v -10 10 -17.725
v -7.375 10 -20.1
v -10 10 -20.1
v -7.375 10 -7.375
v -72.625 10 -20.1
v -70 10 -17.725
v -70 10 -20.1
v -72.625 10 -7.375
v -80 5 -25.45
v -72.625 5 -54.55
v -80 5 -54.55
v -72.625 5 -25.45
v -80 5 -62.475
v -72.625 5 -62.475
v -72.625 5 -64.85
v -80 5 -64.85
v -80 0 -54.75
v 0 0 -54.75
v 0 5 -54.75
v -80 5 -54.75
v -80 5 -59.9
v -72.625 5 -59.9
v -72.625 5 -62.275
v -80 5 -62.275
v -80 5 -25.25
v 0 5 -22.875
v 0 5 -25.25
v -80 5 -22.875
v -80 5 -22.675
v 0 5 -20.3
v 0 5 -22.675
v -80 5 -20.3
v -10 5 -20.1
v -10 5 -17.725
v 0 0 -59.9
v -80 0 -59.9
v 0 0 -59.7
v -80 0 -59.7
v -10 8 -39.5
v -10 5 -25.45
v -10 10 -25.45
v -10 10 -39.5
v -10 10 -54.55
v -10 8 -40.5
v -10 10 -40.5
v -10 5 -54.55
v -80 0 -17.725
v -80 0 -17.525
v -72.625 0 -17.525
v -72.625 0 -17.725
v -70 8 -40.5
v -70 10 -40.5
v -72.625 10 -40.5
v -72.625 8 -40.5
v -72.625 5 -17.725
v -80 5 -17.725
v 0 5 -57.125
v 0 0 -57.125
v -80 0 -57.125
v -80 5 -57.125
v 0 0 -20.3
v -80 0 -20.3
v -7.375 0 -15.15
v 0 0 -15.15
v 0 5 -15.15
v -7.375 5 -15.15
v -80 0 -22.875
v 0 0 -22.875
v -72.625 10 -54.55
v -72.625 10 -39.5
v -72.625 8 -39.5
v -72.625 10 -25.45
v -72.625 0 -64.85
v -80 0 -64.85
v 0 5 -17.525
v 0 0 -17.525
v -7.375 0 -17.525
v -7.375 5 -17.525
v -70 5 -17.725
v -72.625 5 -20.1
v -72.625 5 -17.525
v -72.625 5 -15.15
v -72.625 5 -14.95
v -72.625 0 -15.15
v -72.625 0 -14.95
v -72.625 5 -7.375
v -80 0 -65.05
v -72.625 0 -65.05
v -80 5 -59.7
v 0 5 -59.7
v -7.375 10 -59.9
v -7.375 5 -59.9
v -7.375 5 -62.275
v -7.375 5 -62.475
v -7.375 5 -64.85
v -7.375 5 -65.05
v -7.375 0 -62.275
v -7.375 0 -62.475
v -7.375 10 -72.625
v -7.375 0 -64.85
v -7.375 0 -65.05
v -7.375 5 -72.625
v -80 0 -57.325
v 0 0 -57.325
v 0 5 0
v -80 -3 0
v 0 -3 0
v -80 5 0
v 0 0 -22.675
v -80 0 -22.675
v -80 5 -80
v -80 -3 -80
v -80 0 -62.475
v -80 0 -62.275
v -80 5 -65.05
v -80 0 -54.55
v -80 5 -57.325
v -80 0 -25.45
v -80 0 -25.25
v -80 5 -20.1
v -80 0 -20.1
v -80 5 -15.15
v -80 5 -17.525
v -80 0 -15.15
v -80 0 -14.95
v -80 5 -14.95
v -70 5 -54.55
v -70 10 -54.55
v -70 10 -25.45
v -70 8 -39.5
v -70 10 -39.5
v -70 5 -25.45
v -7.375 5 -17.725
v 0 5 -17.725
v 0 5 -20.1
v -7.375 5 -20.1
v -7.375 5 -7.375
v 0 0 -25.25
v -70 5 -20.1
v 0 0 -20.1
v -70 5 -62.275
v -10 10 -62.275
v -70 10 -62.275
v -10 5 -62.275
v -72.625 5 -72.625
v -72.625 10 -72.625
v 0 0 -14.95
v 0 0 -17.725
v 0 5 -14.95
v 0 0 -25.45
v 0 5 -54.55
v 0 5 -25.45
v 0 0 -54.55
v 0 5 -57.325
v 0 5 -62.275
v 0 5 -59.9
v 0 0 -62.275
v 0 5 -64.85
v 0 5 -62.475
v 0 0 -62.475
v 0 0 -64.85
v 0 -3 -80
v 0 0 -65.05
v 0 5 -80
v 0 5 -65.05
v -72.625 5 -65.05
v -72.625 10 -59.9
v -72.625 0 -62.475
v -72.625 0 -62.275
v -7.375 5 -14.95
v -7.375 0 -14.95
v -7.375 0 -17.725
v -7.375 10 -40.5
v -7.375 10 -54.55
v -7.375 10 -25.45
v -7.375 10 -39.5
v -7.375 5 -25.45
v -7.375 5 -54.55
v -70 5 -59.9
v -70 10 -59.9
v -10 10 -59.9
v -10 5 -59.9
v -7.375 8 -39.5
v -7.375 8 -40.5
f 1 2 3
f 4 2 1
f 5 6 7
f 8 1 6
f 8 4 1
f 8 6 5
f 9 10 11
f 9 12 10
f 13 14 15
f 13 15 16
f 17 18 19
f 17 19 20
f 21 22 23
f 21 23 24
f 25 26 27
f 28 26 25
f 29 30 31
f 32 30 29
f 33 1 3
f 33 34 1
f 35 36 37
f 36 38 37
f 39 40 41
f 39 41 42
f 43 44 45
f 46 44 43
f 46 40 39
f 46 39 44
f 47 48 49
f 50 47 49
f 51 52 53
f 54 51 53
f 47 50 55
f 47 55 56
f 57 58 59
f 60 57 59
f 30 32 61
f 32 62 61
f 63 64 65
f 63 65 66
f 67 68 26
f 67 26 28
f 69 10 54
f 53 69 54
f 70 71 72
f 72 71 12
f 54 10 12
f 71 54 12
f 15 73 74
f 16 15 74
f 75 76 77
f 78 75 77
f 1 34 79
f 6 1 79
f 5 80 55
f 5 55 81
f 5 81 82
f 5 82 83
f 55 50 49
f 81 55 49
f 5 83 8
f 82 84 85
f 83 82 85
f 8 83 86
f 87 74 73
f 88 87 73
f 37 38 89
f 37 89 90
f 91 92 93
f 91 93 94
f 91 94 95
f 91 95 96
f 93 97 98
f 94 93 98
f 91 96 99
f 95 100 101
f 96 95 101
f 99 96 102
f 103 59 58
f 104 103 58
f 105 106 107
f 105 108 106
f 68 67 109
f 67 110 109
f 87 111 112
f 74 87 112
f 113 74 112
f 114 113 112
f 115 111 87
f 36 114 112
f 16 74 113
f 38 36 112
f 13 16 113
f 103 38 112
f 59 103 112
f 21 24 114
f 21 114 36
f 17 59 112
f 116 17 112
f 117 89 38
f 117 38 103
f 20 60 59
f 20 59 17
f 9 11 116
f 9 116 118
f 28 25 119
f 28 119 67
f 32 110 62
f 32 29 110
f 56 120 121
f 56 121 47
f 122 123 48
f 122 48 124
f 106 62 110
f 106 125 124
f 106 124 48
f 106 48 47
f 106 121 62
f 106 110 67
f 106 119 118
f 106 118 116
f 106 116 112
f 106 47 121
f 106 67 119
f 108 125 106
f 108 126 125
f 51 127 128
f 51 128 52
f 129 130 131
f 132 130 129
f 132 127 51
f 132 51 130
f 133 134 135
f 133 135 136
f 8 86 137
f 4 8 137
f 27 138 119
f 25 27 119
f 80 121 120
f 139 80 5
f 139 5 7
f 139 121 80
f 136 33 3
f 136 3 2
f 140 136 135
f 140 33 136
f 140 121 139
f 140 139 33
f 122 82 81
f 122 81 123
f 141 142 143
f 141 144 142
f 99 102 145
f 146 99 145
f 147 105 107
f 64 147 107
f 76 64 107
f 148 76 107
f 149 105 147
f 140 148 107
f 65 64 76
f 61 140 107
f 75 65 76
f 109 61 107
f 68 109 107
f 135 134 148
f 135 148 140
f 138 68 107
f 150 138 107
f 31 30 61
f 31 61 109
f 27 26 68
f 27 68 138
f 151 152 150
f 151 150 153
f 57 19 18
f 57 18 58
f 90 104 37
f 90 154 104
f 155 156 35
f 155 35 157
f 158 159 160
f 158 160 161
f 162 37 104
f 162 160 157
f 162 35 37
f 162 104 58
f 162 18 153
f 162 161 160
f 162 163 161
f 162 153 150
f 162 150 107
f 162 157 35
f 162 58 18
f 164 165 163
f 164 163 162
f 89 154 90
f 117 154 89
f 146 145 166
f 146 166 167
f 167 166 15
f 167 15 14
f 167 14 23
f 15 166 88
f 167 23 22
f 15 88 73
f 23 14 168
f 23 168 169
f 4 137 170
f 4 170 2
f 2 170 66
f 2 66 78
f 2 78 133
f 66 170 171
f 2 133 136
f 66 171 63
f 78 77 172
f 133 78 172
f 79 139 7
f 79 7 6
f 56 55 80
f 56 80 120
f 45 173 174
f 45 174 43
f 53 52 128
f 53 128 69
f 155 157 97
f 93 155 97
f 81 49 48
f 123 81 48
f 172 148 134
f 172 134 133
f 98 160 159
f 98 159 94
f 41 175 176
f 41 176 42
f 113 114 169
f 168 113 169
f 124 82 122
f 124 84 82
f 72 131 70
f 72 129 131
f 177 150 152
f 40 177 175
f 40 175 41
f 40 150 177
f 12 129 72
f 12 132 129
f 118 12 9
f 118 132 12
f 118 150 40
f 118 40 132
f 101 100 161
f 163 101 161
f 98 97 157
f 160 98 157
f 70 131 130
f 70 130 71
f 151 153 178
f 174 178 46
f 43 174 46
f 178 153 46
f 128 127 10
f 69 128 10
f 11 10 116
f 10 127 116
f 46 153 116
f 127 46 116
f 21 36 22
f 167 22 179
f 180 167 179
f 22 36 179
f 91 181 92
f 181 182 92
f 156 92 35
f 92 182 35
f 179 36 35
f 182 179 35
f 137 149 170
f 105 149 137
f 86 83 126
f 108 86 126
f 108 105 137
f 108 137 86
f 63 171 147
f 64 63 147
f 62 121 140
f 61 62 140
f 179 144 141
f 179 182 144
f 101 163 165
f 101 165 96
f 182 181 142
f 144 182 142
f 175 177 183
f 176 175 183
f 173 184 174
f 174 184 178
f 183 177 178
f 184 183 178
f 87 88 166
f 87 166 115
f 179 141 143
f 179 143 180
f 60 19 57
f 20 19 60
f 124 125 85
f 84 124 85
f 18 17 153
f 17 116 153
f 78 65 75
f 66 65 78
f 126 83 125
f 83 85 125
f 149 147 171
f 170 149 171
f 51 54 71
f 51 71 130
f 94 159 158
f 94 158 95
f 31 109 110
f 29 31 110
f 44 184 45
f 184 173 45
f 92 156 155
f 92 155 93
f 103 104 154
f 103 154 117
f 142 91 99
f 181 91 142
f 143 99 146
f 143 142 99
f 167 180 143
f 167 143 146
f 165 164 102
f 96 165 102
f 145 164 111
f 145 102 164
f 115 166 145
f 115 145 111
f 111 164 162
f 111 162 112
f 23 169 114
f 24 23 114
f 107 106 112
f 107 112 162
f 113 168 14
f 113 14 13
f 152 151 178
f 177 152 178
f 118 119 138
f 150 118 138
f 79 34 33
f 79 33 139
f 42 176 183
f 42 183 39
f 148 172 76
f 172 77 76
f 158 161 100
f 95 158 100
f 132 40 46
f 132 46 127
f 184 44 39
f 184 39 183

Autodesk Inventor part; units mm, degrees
ref_plane "YZ Plane" through (0, 0, 0) normal (1, 0, 0) x (0, 1, 0)
ref_plane "XZ Plane" through (0, 0, 0) normal (0, 1, 0) x (-1, 0, 0)
ref_plane "XY Plane" through (0, 0, 0) normal (0, 0, 1) x (1, 0, 0)
sketch "Boceto1" plane through (0, 0, 0) normal (0, 1, 0) x (-1, 0, 0)
  line L0 (0, 0) -> (80, 0)
  line L1 (80, 0) -> (80, -80)
  line L2 (80, -80) -> (0, -80)
  line L3 (0, -80) -> (0, 0)
  line L4 (10, -70) -> (70, -70)
  line L5 (70, -70) -> (70, -10)
  line L6 (70, -10) -> (10, -10)
  line L7 (10, -10) -> (10, -70)
  line L8 (0, -12.375) -> (80, -12.375)
  line L9 (0, -14.95) -> (80, -14.95)
  line L10 (0, -17.525) -> (80, -17.525)
  line L11 (80, -20.1) -> (0, -20.1)
  line L12 (0, -22.675) -> (80, -22.675)
  line L13 (0, -12.575) -> (80, -12.575)
  line L14 (0, -15.15) -> (80, -15.15)
  line L15 (0, -17.725) -> (80, -17.725)
  line L16 (80, -20.3) -> (0, -20.3)
  line L17 (0, -22.875) -> (80, -22.875)
  line L18 (0, -25.25) -> (80, -25.25)
  line L19 (0, -25.45) -> (80, -25.45)
  line L20 (10, -40) -> (80, -40)
  line L21 (0, -67.625) -> (80, -67.625)
  line L22 (0, -65.05) -> (80, -65.05)
  line L23 (0, -62.475) -> (80, -62.475)
  line L24 (80, -59.9) -> (0, -59.9)
  line L25 (0, -57.325) -> (80, -57.325)
  line L26 (0, -67.425) -> (80, -67.425)
  line L27 (0, -64.85) -> (80, -64.85)
  line L28 (0, -62.275) -> (80, -62.275)
  line L29 (80, -59.7) -> (0, -59.7)
  line L30 (0, -57.125) -> (80, -57.125)
  line L31 (0, -54.75) -> (80, -54.75)
  line L32 (0, -54.55) -> (80, -54.55)
  line L33 (72.625, -7.375) -> (7.375, -7.375)
  line L34 (7.375, -7.375) -> (7.375, -72.625)
  line L35 (7.375, -72.625) -> (72.625, -72.625)
  line L36 (72.625, -72.625) -> (72.625, -7.375)
  line L37 (7.375, 0) -> (0, 0)
  line L38 (7.375, -80) -> (0, -80)
  point P0 (10, -12.375)
  point P1 (70, -12.375)
  point P2 (10, -14.95)
  point P3 (70, -14.95)
  point P4 (10, -17.525)
  point P5 (70, -17.525)
  point P6 (70, -20.1)
  point P7 (10, -20.1)
  point P8 (10, -22.675)
  point P9 (70, -22.675)
  point P10 (10, -12.575)
  point P11 (70, -12.575)
  point P12 (10, -15.15)
  point P13 (70, -15.15)
  point P14 (10, -17.725)
  point P15 (70, -17.725)
  point P16 (70, -20.3)
  point P17 (10, -20.3)
  point P18 (10, -22.875)
  point P19 (70, -22.875)
  point P20 (10, -25.25)
  point P21 (70, -25.25)
  point P22 (10, -25.45)
  point P23 (70, -25.45)
  point P24 (10, -67.625)
  point P25 (70, -67.625)
  point P26 (10, -65.05)
  point P27 (70, -65.05)
  point P28 (10, -62.475)
  point P29 (70, -62.475)
  point P30 (70, -59.9)
  point P31 (10, -59.9)
  point P32 (10, -57.325)
  point P33 (70, -57.325)
  point P34 (10, -67.425)
  point P35 (70, -67.425)
  point P36 (10, -64.85)
  point P37 (70, -64.85)
  point P38 (10, -62.275)
  point P39 (70, -62.275)
  point P40 (70, -59.7)
  point P41 (10, -59.7)
  point P42 (10, -57.125)
  point P43 (70, -57.125)
  point P44 (10, -54.75)
  point P45 (70, -54.75)
  point P46 (10, -54.55)
  point P47 (70, -54.55)
  point P48 (72.625, -12.375)
  point P49 (7.375, -12.375)
  point P50 (72.625, -54.55)
  point P51 (72.625, -25.45)
  point P52 (70, -25.45)
  point P53 (70, -54.55)
  point P54 (7.375, -25.45)
  point P55 (7.375, -54.55)
  point P56 (10, -54.55)
  point P57 (10, -25.45)
  point P58 (10, -67.625)
  point P59 (7.375, -67.625)
  point P60 (72.625, -67.625)
  point P61 (70, -67.625)
  point P62 (7.375, -14.95)
  point P63 (72.625, -14.95)
  point P64 (72.625, -65.05)
  point P65 (70, -65.05)
  point P66 (10, -65.05)
  point P67 (7.375, -65.05)
  point P68 (70, -67.425)
  point P69 (10, -67.425)
  point P70 (10, -12.575)
  point P71 (70, -12.575)
  point P72 (72.625, -64.85)
  point P73 (7.375, -64.85)
  point P74 (7.375, -15.15)
  point P75 (70, -15.15)
  point P76 (7.375, -62.475)
  point P77 (10, -64.85)
  point P78 (10, -62.475)
  point P79 (72.625, -62.475)
  point P80 (70, -62.475)
  point P81 (70, -64.85)
  point P82 (7.375, -17.525)
  point P83 (10, -15.15)
  point P84 (72.625, -17.525)
  point P85 (72.625, -20.1)
  point P86 (7.375, -20.1)
  point P87 (72.625, -59.9)
  point P88 (70, -59.9)
  point P89 (70, -62.275)
  point P90 (10, -62.275)
  point P91 (10, -59.9)
  point P92 (7.375, -59.9)
  point P93 (10, -17.725)
  point P94 (70, -17.725)
  dimension "d0" = 80
  dimension "d1" = 80
  dimension "d2" = 60
  dimension "d3" = 60
  dimension "d4" = 10
  dimension "d5" = 10
  dimension "d6" = 2.375
  dimension "d7" = 0.2
  dimension "d8" = 2.375
  dimension "d9" = 0.2
  dimension "d10" = 0.2
  dimension "d11" = 0.2
  dimension "d12" = 0.2
  dimension "d13" = 2.375
  dimension "d14" = 2.375
  dimension "d15" = 2.375
  dimension "d16" = 2.375
  dimension "d17" = 0.2
  dimension "d35" = 5
extrude "Extrusión1" add sketch "Boceto1" along normal blind 5 contours L0 L1 L8 L36 L33 L34 L3 | L8 L34 L13 L3 | L13 L34 L9 L3 | L34 L33 L36 L8 L5 L6 L7 | L8 L7 L13 L34 | L1 L13 L36 L8 | L13 L7 L9 L34 | L8 L5 L13 L7 | L7 L6 L5 L8 | L1 L9 L36 L13 | L36 L13 L5 L8 | L14 L34 L10 L3 | L13 L5 L9 L7 | L36 L9 L5 L13 | L14 L7 L10 L34 | L1 L10 L36 L14 | L15 L34 L11 L3 | L14 L5 L10 L7 | L36 L10 L5 L14 | L15 L7 L11 L34 | L1 L11 L36 L15 | L16 L34 L12 L3 | L15 L5 L11 L7 | L36 L11 L5 L15 | L16 L7 L12 L34 | L1 L12 L36 L16 | L17 L34 L18 L3 | L16 L5 L12 L7 | L36 L12 L5 L16 | L17 L7 L18 L34 | L1 L18 L36 L17 | L19 L34 L32 L3 | L17 L5 L18 L7 | L36 L18 L5 L17 | L19 L7 L32 L34 | L1 L20 L36 L19 | L31 L34 L30 L3 | L19 L5 L20 L7 | L1 L32 L36 L20 | L36 L20 L5 L19 | L31 L7 L30 L34 | L7 L20 L5 L32 | L36 L32 L5 L20 | L25 L34 L29 L3 | L31 L5 L30 L7 | L1 L30 L36 L31 | L25 L7 L29 L34 | L31 L36 L30 L5 | L24 L34 L28 L3 | L25 L5 L29 L7 | L1 L29 L36 L25 | L24 L7 L28 L34 | L25 L36 L29 L5 | L23 L34 L27 L3 | L24 L5 L28 L7 | L1 L28 L36 L24 | L23 L7 L27 L34 | L24 L36 L28 L5 | L22 L34 L26 L3 | L23 L5 L27 L7 | L1 L27 L36 L23 | L26 L34 L21 L3 | L22 L7 L26 L34 | L23 L36 L27 L5 | L21 L34 L35 L36 L1 L2 L3 | L26 L7 L21 L34 | L22 L5 L26 L7 | L1 L26 L36 L22 | L21 L7 L4 L5 L36 L35 L34 | L26 L5 L21 L7 | L22 L36 L26 L5 | L1 L21 L36 L26 | L21 L5 L4 L7 | L26 L36 L21 L5
sketch "Boceto2" plane through (0, 0, 0) normal (0, -1, 0) x (1, 0, 0)
  line L0 (0, -80) -> (-80, -80) projected
  line L1 (-80, 0) -> (0, 0) projected
  line L2 (-80, -80) -> (-80, 0)
  line L3 (-80, 0) -> (0, 0)
  line L4 (-80, -65.05) -> (0, -65.05) construction
  line L5 (0, 0) -> (0, -80)
  line L6 (-80, -80) -> (0, -80)
extrude "Extrusión4" add sketch "Boceto2" along normal blind 3
extrude "Extrusión5" add sketch "Boceto1" along normal blind 10 contours L34 L33 L36 L8 L5 L6 L7 | L8 L7 L13 L34 | L13 L7 L9 L34 | L8 L5 L13 L7 | L7 L6 L5 L8 | L36 L13 L5 L8 | L9 L7 L14 L34 | L13 L5 L9 L7 | L36 L9 L5 L13 | L14 L7 L10 L34 | L9 L5 L14 L7 | L36 L14 L5 L9 | L10 L7 L15 L34 | L14 L5 L10 L7 | L36 L10 L5 L14 | L15 L7 L11 L34 | L10 L5 L15 L7 | L36 L15 L5 L10 | L36 L11 L5 L15 | L19 L7 L32 L34 | L36 L20 L5 L19 | L36 L32 L5 L20 | L24 L7 L28 L34 | L28 L7 L23 L34 | L23 L7 L27 L34 | L28 L5 L23 L7 | L24 L36 L28 L5 | L27 L7 L22 L34 | L23 L5 L27 L7 | L28 L36 L23 L5 | L22 L7 L26 L34 | L27 L5 L22 L7 | L23 L36 L27 L5 | L26 L7 L21 L34 | L22 L5 L26 L7 | L27 L36 L22 L5 | L21 L7 L4 L5 L36 L35 L34 | L26 L5 L21 L7 | L22 L36 L26 L5 | L21 L5 L4 L7 | L26 L36 L21 L5
sketch "Boceto3" plane through (0, 10, 0) normal (0, 1, 0) x (1, 0, 0)
  line L0 (-7.375, 25.45) -> (-7.375, 54.55) projected
  line L1 (-7.375, 40) -> (-86.5517, 40)
  line L2 (-5, 39.5) -> (-84.1767, 39.5)
  line L3 (-5, 40.5) -> (-84.1767, 40.5)
  line L4 (-10, 54.55) -> (-10, 25.45) projected
  line L5 (-5, 40.5) -> (-5, 39.5)
  line L6 (-84.1767, 40.5) -> (-84.1767, 39.5)
  point P0 (0, 0)
  point P1 (-10, 40)
  point P2 (-10, 39.5)
  point P3 (-10, 40.5)
  point P4 (-7.375, 39.5)
  point P5 (-7.375, 40.5)
  dimension "d31" = 0.5
  dimension "d32" = 0.5
extrude "Extrusión6" cut sketch "Boceto3" against normal blind 2 contours L2 L4 L1 L0 | L1 L4 L3 L0 | L2 L6 L1 L4 | L1 L6 L3 L4
equation "\"d8\" = d6"
equation "\"d9\" = d7"
equation "\"d10\" = d9"
equation "\"d11\" = d7"
equation "\"d12\" = d7"
equation "\"d13\" = d6"
equation "\"d14\" = d6"
equation "\"d15\" = d6"
equation "\"d16\" = d6"
equation "\"d17\" = d7"
properties part number "Cortador Ancho PDMS4.5"
